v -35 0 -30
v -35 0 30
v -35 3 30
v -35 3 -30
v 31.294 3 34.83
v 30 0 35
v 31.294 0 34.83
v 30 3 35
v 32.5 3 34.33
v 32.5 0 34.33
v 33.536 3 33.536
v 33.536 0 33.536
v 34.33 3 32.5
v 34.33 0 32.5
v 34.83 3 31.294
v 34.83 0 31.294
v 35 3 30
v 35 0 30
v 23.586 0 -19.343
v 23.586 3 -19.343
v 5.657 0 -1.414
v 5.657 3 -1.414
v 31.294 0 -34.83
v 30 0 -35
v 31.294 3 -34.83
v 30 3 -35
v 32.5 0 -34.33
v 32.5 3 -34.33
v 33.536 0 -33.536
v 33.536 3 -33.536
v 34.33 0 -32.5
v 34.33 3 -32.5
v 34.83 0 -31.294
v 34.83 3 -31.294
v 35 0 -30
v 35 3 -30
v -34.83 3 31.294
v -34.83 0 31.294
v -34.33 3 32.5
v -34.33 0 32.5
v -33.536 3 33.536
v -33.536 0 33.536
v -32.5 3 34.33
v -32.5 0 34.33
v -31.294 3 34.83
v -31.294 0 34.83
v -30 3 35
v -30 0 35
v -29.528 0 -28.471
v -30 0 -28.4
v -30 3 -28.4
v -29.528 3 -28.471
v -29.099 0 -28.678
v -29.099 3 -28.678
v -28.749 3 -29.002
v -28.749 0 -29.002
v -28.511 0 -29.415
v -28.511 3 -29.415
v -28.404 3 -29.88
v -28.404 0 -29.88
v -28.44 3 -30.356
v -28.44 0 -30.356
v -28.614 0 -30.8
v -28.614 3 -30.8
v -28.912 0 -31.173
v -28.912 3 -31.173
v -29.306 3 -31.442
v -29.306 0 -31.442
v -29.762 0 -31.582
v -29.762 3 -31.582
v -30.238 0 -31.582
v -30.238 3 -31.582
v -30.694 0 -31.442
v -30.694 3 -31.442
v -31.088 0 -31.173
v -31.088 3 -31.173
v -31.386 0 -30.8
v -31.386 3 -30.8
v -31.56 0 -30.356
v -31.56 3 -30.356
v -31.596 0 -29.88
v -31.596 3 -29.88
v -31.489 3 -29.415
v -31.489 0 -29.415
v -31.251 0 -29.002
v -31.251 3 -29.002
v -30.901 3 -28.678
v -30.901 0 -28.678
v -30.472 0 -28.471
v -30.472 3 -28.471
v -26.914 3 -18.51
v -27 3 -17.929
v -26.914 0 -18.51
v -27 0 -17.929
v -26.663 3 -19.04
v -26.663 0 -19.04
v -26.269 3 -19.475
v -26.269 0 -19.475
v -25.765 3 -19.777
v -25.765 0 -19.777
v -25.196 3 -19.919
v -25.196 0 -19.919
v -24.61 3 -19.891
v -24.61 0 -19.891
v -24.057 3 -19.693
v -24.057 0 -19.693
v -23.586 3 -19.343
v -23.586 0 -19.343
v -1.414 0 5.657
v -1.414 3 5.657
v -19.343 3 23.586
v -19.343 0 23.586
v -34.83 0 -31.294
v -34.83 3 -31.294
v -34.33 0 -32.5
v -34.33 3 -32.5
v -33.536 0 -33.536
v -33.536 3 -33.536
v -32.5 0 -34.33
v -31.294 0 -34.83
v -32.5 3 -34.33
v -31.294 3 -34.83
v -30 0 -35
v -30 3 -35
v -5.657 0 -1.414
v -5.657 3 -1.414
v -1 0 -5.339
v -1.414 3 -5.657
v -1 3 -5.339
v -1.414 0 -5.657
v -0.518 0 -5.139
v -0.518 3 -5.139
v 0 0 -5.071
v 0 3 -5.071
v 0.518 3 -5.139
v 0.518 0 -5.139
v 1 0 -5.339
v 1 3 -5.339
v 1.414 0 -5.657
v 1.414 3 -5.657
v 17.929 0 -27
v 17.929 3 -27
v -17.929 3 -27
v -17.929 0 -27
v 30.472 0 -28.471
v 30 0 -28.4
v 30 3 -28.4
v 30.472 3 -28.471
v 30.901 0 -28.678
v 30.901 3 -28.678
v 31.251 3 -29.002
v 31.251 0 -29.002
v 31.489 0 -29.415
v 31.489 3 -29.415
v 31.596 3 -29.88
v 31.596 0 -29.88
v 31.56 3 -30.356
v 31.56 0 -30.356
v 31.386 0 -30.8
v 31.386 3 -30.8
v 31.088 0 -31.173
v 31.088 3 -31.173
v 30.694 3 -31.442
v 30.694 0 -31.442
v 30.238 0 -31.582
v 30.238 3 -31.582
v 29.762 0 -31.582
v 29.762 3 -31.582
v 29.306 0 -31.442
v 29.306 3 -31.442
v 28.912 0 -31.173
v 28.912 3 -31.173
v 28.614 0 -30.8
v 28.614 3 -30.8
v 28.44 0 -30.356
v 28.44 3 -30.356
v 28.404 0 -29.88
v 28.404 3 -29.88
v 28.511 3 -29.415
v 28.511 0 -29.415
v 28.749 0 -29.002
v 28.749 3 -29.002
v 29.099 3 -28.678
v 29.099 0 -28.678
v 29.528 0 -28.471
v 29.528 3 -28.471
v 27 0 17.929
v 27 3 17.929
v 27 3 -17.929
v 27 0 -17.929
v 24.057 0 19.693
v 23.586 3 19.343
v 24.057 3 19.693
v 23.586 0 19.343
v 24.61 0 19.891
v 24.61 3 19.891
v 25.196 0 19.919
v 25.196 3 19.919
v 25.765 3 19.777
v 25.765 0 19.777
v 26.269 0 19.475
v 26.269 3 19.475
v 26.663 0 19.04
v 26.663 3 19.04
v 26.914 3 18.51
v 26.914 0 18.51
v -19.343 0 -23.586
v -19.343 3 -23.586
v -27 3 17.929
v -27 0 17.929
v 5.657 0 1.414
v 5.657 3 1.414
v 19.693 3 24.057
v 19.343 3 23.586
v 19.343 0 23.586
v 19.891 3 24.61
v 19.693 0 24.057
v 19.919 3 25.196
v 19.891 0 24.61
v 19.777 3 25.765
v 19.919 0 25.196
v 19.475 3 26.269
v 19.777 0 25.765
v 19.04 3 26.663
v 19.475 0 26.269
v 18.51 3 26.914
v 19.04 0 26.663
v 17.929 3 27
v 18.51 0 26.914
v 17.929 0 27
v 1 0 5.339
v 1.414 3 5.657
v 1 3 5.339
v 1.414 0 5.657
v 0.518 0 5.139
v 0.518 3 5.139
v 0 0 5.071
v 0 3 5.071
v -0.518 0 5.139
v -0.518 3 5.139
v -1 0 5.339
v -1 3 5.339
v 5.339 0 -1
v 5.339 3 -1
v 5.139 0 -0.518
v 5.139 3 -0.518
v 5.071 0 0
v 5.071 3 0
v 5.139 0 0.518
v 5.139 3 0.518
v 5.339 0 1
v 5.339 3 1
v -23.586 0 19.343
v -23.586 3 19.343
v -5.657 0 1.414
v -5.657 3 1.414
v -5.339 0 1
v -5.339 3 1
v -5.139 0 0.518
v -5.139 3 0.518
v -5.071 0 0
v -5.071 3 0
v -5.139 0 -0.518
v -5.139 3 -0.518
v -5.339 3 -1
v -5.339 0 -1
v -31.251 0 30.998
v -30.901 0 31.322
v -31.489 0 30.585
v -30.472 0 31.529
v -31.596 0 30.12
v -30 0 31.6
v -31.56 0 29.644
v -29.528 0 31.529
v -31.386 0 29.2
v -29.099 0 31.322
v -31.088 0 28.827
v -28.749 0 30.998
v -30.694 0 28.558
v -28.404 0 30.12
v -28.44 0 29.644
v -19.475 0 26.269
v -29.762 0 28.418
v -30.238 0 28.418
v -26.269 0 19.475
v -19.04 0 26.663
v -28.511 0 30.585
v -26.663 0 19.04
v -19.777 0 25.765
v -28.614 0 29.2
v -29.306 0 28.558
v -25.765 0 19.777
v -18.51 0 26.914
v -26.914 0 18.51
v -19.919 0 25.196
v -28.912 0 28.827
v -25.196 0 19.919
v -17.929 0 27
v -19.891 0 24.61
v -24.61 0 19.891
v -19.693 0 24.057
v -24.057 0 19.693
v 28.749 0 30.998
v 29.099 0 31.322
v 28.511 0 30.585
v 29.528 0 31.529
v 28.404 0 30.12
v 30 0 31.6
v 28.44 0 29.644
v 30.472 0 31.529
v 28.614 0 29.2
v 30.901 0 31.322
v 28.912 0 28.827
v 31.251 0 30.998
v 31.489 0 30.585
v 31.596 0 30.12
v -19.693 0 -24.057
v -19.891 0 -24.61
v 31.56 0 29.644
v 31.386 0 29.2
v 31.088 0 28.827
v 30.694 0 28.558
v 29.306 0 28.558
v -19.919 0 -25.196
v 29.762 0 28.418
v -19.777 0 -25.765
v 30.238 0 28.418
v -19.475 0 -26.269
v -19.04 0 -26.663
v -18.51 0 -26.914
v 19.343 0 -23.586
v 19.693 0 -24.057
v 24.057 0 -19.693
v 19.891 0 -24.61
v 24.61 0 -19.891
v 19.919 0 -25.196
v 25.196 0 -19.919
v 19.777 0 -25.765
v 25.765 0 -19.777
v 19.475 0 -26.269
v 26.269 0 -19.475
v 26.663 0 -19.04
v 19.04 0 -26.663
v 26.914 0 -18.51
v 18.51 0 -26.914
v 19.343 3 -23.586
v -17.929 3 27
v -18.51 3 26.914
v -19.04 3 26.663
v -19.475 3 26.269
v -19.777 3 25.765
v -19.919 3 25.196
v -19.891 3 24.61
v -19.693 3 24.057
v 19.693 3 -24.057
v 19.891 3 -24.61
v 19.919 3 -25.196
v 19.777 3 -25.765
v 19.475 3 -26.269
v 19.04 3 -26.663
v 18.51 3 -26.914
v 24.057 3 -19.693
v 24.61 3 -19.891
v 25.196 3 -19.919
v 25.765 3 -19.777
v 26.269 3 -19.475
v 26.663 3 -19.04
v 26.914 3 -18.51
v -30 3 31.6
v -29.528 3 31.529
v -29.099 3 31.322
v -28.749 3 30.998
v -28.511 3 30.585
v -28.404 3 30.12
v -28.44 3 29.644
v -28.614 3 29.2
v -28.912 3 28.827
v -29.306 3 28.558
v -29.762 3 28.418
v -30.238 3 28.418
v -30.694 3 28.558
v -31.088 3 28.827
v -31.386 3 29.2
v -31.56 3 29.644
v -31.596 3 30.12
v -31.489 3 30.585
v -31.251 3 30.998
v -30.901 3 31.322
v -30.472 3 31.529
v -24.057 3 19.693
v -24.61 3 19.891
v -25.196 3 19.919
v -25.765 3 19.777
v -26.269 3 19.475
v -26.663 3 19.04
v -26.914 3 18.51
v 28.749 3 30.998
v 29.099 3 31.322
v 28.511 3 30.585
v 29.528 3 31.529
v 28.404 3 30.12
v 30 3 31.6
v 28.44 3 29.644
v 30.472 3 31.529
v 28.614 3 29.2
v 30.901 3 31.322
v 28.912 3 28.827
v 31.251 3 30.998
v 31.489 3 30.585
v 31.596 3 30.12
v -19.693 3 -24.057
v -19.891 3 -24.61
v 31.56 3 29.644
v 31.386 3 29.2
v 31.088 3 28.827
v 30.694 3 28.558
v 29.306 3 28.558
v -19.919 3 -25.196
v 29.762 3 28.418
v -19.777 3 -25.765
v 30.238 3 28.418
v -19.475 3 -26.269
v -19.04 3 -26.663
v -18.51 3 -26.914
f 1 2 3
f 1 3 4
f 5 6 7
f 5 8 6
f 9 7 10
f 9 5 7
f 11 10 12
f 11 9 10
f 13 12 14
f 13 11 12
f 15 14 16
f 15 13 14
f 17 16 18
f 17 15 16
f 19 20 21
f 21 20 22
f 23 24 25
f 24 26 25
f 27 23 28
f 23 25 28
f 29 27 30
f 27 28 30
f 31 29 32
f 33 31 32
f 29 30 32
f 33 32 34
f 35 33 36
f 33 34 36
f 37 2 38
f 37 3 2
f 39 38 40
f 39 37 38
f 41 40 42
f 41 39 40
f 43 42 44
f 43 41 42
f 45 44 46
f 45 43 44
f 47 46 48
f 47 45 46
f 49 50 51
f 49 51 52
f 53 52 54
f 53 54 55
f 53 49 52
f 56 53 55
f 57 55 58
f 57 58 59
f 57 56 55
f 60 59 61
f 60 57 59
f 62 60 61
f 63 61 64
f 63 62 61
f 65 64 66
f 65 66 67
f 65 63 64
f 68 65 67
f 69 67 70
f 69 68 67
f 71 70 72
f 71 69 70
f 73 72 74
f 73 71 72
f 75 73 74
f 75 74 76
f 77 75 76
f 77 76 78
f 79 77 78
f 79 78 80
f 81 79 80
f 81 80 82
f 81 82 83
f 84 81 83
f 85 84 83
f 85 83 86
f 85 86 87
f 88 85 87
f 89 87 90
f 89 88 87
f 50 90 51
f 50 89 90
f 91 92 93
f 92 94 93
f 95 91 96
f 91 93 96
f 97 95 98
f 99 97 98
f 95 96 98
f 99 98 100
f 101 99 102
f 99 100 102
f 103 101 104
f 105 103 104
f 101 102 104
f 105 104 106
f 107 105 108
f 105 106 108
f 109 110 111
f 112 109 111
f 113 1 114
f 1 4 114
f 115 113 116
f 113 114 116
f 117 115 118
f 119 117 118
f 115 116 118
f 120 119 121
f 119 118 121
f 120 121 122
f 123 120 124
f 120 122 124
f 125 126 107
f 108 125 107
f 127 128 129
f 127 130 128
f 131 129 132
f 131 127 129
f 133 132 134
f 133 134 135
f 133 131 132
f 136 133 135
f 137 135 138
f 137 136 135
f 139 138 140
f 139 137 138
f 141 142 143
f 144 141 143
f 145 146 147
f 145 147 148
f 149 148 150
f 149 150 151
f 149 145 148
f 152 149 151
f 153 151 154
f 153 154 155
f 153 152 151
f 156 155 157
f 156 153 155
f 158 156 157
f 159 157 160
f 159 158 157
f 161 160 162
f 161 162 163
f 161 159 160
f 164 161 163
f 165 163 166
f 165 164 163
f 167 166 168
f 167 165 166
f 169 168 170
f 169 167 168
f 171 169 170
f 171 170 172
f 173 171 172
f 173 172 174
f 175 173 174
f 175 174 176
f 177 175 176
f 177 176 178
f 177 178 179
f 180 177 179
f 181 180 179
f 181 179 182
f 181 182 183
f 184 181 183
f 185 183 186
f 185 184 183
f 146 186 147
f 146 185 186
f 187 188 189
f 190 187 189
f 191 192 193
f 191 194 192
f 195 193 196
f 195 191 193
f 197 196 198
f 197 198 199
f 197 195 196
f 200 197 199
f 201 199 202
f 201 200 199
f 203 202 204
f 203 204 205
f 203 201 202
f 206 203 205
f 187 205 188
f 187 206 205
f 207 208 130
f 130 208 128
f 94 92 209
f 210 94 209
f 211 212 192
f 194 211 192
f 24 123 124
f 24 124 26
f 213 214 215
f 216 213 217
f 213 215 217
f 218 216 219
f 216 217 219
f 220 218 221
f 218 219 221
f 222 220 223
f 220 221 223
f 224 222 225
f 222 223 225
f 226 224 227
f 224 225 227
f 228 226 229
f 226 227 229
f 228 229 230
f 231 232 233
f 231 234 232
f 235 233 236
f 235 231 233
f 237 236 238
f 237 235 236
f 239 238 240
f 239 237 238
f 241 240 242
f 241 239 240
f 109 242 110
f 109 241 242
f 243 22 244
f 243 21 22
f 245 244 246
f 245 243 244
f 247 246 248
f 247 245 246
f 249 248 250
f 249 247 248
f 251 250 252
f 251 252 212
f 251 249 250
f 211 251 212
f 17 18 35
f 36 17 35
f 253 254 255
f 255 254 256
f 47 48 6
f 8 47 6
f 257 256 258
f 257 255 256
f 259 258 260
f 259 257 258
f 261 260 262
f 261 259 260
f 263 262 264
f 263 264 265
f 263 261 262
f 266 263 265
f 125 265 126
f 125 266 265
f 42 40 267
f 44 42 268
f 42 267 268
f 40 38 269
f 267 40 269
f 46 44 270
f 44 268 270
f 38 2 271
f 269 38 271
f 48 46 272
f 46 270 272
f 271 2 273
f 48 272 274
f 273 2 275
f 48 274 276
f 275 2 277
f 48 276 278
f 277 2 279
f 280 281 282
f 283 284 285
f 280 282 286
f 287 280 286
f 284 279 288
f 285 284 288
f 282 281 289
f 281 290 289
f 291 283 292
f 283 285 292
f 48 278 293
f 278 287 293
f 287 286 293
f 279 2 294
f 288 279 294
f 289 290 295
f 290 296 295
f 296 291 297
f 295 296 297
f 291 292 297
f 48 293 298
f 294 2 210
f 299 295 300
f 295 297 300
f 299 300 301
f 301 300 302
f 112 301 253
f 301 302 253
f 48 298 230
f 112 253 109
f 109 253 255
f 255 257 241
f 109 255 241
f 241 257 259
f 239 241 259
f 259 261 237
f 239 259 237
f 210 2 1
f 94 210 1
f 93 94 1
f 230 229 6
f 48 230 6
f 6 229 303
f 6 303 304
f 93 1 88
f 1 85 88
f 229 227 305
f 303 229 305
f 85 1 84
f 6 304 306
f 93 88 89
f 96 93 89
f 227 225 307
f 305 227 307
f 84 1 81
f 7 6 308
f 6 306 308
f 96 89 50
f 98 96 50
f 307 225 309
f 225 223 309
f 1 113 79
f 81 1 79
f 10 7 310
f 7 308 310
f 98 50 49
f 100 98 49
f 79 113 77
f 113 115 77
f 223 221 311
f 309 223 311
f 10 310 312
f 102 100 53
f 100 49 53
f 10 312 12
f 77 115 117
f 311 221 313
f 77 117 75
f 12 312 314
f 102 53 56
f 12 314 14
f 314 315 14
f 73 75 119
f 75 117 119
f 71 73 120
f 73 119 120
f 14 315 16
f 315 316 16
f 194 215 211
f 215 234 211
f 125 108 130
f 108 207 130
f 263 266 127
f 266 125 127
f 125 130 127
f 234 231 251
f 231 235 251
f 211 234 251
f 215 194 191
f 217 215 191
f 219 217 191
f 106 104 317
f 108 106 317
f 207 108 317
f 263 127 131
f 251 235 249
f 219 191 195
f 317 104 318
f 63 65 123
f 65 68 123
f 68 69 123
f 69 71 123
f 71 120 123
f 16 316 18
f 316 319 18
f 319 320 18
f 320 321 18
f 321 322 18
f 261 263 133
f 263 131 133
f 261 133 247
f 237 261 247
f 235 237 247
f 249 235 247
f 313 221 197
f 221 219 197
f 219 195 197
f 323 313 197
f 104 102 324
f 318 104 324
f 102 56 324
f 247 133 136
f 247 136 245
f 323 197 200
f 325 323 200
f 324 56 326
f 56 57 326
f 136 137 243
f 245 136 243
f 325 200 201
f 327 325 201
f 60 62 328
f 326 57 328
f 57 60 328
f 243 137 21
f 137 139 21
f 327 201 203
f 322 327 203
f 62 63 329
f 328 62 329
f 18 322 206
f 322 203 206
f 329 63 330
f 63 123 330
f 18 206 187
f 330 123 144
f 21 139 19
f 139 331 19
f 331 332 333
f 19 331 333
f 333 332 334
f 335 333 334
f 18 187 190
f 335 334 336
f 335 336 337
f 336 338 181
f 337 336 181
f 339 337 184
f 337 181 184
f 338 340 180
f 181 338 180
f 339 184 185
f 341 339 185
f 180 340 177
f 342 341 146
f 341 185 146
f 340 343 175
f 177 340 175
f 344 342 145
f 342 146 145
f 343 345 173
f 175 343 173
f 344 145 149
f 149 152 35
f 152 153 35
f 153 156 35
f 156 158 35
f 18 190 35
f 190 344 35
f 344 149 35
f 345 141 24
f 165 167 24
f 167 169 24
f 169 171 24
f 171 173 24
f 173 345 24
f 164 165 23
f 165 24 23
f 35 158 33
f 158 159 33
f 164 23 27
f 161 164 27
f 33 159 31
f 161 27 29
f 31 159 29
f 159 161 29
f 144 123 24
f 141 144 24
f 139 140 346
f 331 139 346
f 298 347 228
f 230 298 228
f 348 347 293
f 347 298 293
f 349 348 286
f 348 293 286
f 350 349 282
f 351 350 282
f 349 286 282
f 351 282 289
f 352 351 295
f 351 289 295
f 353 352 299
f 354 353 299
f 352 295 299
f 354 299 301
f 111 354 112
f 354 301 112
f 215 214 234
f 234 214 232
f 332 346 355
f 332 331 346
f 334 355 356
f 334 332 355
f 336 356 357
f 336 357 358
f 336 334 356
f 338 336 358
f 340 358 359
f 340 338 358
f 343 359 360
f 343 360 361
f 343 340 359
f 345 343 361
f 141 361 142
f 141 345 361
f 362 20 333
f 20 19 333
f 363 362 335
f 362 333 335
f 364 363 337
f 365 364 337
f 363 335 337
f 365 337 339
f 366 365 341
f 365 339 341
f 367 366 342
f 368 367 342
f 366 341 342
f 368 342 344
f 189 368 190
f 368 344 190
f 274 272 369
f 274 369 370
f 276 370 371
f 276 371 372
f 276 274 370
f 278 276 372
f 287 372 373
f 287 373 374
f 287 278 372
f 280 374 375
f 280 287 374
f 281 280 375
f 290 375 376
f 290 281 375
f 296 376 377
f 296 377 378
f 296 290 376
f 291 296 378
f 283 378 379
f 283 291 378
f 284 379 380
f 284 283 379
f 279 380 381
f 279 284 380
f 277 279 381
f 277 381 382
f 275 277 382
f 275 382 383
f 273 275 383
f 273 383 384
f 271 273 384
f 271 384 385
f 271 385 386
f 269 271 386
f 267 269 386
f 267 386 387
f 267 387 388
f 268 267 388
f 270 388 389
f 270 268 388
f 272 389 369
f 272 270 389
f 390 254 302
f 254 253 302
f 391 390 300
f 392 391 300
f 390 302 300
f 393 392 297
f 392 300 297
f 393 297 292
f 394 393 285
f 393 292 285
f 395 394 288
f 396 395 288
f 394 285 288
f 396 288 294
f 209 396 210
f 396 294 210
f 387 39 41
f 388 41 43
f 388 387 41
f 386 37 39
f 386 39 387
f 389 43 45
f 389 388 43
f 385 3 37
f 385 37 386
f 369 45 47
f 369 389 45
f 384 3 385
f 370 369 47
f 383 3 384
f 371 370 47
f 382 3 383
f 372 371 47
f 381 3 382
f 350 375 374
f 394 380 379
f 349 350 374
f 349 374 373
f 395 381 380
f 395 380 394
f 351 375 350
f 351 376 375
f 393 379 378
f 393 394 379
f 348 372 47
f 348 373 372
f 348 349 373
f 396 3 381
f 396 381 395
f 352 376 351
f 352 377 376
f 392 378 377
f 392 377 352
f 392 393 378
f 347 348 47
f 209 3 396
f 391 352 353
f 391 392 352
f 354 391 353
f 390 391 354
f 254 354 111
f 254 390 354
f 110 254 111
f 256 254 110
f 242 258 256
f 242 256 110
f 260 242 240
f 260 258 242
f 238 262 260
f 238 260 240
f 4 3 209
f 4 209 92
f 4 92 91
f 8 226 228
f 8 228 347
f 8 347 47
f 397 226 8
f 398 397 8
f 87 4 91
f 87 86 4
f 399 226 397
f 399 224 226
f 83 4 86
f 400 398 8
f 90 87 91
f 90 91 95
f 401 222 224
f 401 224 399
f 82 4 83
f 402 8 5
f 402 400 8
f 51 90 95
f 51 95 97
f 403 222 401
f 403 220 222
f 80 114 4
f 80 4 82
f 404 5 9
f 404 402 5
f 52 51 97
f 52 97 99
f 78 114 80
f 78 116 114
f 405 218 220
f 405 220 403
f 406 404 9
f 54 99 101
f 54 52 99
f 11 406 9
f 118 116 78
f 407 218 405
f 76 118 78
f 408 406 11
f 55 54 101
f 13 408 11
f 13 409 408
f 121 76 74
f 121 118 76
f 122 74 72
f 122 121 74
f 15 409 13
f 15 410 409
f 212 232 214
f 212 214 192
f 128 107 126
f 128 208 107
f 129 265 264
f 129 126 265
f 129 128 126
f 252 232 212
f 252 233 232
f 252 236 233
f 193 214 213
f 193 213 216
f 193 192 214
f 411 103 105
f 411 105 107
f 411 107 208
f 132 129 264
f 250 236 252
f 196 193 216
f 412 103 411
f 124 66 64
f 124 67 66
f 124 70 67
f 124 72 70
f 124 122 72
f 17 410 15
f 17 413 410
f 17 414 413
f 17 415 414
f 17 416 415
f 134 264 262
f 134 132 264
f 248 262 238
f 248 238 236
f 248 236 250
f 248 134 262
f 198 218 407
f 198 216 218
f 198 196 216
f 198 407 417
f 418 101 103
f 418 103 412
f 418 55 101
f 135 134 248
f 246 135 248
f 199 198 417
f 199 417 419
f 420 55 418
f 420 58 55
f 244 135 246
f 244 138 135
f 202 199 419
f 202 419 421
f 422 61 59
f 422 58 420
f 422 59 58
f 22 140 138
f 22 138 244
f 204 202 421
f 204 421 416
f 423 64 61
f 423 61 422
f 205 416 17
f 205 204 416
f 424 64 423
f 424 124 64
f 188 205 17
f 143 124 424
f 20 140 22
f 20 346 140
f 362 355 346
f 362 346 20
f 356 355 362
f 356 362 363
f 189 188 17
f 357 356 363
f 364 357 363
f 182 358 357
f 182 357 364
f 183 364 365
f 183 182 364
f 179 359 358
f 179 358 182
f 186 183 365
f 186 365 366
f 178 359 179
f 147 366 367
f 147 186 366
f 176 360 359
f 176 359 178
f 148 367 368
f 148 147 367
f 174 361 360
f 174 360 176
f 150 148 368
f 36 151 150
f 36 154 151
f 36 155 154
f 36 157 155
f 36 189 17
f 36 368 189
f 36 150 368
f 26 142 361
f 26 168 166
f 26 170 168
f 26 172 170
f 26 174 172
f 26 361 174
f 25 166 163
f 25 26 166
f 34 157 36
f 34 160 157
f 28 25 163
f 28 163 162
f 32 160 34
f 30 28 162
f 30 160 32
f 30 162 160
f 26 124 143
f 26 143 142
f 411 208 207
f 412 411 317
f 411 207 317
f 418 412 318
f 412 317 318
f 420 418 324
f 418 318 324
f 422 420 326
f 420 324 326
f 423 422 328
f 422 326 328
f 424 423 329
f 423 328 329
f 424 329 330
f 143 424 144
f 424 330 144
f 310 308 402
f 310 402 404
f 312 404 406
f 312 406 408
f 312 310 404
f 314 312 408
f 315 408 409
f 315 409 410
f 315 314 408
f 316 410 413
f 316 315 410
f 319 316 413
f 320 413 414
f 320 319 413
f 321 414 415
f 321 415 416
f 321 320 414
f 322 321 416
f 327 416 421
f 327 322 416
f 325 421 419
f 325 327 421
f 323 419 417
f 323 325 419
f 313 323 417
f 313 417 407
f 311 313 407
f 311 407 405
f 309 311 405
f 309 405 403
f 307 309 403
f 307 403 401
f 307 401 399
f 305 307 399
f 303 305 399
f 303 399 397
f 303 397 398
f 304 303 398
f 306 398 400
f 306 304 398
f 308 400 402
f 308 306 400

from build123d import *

# Parameters (mm, degrees)
SKETCH_1_W                       = 70
SKETCH_1_H                       = 70
SKETCH_1_R                       = 1.6
EXTRUDE_1_DEPTH                  = 3
FILLET_1_R                       = 5
CUT_EXTRUDE_2_DEPTH              = 50.588305073
FILLET_2_R                       = 2
PATTERN_CIRCULAR_1_COUNT         = 4
FILLET_2_OF_PATTERN_CIRCULAR_1_R = 2


with BuildPart() as part:
    # 草图1 → 凸台-拉伸1 (new body)
    with BuildSketch(Plane(origin=(0, 0, 0), x_dir=(1, 0, 0), z_dir=(0, 1, 0))):
        Rectangle(SKETCH_1_W, SKETCH_1_H)
        with Locations(Location((-30, 30, 0), (0, 0, 270))):
            Circle(SKETCH_1_R, mode=Mode.SUBTRACT)
        with Locations(Location((30, 30, 0), (0, 0, 270))):
            Circle(SKETCH_1_R, mode=Mode.SUBTRACT)
        with Locations(Location((30, -30, 0), (0, 0, 270))):
            Circle(SKETCH_1_R, mode=Mode.SUBTRACT)
        with Locations(Location((-30, -30, 0), (0, 0, 270))):
            Circle(SKETCH_1_R, mode=Mode.SUBTRACT)
    extrude(amount=EXTRUDE_1_DEPTH)

    # 圆角1
    fillet_1_edges = [part.edges().sort_by_distance(p)[0] for p in [
        (-35, 1.5, -35),
        (35, 1.5, -35),
        (35, 1.5, 35),
        (-35, 1.5, 35),
    ]]
    fillet(fillet_1_edges, radius=FILLET_1_R)

    # 草图2 → 切除-拉伸2 (cut, through all)
    with BuildSketch(Plane(origin=(0, 3, 0), x_dir=(1, 0, 0), z_dir=(0, 1, 0))):
        Polygon((-22.757359313, 27), (0, 4.242640687), (22.757359313, 27), align=None)
    cut_extrude_2 = extrude(amount=-CUT_EXTRUDE_2_DEPTH, mode=Mode.SUBTRACT)

    # 圆角2
    fillet_2_edges = [part.edges().sort_by_distance(p)[0] for p in [
        (22.757359313, 1.5, -27),
        (0, 1.5, -4.242640687),
        (-22.757359313, 1.5, -27),
    ]]
    fillet(fillet_2_edges, radius=FILLET_2_R)

    # 阵列(圆周)1: 切除-拉伸2 ×4 about axis
    pattern_circular_1_axis = Axis((0, 0, 0), (0, 1, 0))
    for i in range(1, PATTERN_CIRCULAR_1_COUNT):
        add(cut_extrude_2.rotate(pattern_circular_1_axis, i * 360 / PATTERN_CIRCULAR_1_COUNT), mode=Mode.SUBTRACT)

    # 圆角2 of 阵列(圆周)1
    fillet_2_of_pattern_circular_1_edges = [part.edges().sort_by_distance(p)[0] for p in [
        (-27, 1.5, -22.757359313),
        (-4.242640687, 1.5, 0),
        (-27, 1.5, 22.757359313),
        (-22.757359313, 1.5, 27),
        (0, 1.5, 4.242640687),
        (22.757359313, 1.5, 27),
        (27, 1.5, 22.757359313),
        (4.242640687, 1.5, 0),
        (27, 1.5, -22.757359313),
    ]]
    fillet(fillet_2_of_pattern_circular_1_edges, radius=FILLET_2_OF_PATTERN_CIRCULAR_1_R)


solid = part.part
